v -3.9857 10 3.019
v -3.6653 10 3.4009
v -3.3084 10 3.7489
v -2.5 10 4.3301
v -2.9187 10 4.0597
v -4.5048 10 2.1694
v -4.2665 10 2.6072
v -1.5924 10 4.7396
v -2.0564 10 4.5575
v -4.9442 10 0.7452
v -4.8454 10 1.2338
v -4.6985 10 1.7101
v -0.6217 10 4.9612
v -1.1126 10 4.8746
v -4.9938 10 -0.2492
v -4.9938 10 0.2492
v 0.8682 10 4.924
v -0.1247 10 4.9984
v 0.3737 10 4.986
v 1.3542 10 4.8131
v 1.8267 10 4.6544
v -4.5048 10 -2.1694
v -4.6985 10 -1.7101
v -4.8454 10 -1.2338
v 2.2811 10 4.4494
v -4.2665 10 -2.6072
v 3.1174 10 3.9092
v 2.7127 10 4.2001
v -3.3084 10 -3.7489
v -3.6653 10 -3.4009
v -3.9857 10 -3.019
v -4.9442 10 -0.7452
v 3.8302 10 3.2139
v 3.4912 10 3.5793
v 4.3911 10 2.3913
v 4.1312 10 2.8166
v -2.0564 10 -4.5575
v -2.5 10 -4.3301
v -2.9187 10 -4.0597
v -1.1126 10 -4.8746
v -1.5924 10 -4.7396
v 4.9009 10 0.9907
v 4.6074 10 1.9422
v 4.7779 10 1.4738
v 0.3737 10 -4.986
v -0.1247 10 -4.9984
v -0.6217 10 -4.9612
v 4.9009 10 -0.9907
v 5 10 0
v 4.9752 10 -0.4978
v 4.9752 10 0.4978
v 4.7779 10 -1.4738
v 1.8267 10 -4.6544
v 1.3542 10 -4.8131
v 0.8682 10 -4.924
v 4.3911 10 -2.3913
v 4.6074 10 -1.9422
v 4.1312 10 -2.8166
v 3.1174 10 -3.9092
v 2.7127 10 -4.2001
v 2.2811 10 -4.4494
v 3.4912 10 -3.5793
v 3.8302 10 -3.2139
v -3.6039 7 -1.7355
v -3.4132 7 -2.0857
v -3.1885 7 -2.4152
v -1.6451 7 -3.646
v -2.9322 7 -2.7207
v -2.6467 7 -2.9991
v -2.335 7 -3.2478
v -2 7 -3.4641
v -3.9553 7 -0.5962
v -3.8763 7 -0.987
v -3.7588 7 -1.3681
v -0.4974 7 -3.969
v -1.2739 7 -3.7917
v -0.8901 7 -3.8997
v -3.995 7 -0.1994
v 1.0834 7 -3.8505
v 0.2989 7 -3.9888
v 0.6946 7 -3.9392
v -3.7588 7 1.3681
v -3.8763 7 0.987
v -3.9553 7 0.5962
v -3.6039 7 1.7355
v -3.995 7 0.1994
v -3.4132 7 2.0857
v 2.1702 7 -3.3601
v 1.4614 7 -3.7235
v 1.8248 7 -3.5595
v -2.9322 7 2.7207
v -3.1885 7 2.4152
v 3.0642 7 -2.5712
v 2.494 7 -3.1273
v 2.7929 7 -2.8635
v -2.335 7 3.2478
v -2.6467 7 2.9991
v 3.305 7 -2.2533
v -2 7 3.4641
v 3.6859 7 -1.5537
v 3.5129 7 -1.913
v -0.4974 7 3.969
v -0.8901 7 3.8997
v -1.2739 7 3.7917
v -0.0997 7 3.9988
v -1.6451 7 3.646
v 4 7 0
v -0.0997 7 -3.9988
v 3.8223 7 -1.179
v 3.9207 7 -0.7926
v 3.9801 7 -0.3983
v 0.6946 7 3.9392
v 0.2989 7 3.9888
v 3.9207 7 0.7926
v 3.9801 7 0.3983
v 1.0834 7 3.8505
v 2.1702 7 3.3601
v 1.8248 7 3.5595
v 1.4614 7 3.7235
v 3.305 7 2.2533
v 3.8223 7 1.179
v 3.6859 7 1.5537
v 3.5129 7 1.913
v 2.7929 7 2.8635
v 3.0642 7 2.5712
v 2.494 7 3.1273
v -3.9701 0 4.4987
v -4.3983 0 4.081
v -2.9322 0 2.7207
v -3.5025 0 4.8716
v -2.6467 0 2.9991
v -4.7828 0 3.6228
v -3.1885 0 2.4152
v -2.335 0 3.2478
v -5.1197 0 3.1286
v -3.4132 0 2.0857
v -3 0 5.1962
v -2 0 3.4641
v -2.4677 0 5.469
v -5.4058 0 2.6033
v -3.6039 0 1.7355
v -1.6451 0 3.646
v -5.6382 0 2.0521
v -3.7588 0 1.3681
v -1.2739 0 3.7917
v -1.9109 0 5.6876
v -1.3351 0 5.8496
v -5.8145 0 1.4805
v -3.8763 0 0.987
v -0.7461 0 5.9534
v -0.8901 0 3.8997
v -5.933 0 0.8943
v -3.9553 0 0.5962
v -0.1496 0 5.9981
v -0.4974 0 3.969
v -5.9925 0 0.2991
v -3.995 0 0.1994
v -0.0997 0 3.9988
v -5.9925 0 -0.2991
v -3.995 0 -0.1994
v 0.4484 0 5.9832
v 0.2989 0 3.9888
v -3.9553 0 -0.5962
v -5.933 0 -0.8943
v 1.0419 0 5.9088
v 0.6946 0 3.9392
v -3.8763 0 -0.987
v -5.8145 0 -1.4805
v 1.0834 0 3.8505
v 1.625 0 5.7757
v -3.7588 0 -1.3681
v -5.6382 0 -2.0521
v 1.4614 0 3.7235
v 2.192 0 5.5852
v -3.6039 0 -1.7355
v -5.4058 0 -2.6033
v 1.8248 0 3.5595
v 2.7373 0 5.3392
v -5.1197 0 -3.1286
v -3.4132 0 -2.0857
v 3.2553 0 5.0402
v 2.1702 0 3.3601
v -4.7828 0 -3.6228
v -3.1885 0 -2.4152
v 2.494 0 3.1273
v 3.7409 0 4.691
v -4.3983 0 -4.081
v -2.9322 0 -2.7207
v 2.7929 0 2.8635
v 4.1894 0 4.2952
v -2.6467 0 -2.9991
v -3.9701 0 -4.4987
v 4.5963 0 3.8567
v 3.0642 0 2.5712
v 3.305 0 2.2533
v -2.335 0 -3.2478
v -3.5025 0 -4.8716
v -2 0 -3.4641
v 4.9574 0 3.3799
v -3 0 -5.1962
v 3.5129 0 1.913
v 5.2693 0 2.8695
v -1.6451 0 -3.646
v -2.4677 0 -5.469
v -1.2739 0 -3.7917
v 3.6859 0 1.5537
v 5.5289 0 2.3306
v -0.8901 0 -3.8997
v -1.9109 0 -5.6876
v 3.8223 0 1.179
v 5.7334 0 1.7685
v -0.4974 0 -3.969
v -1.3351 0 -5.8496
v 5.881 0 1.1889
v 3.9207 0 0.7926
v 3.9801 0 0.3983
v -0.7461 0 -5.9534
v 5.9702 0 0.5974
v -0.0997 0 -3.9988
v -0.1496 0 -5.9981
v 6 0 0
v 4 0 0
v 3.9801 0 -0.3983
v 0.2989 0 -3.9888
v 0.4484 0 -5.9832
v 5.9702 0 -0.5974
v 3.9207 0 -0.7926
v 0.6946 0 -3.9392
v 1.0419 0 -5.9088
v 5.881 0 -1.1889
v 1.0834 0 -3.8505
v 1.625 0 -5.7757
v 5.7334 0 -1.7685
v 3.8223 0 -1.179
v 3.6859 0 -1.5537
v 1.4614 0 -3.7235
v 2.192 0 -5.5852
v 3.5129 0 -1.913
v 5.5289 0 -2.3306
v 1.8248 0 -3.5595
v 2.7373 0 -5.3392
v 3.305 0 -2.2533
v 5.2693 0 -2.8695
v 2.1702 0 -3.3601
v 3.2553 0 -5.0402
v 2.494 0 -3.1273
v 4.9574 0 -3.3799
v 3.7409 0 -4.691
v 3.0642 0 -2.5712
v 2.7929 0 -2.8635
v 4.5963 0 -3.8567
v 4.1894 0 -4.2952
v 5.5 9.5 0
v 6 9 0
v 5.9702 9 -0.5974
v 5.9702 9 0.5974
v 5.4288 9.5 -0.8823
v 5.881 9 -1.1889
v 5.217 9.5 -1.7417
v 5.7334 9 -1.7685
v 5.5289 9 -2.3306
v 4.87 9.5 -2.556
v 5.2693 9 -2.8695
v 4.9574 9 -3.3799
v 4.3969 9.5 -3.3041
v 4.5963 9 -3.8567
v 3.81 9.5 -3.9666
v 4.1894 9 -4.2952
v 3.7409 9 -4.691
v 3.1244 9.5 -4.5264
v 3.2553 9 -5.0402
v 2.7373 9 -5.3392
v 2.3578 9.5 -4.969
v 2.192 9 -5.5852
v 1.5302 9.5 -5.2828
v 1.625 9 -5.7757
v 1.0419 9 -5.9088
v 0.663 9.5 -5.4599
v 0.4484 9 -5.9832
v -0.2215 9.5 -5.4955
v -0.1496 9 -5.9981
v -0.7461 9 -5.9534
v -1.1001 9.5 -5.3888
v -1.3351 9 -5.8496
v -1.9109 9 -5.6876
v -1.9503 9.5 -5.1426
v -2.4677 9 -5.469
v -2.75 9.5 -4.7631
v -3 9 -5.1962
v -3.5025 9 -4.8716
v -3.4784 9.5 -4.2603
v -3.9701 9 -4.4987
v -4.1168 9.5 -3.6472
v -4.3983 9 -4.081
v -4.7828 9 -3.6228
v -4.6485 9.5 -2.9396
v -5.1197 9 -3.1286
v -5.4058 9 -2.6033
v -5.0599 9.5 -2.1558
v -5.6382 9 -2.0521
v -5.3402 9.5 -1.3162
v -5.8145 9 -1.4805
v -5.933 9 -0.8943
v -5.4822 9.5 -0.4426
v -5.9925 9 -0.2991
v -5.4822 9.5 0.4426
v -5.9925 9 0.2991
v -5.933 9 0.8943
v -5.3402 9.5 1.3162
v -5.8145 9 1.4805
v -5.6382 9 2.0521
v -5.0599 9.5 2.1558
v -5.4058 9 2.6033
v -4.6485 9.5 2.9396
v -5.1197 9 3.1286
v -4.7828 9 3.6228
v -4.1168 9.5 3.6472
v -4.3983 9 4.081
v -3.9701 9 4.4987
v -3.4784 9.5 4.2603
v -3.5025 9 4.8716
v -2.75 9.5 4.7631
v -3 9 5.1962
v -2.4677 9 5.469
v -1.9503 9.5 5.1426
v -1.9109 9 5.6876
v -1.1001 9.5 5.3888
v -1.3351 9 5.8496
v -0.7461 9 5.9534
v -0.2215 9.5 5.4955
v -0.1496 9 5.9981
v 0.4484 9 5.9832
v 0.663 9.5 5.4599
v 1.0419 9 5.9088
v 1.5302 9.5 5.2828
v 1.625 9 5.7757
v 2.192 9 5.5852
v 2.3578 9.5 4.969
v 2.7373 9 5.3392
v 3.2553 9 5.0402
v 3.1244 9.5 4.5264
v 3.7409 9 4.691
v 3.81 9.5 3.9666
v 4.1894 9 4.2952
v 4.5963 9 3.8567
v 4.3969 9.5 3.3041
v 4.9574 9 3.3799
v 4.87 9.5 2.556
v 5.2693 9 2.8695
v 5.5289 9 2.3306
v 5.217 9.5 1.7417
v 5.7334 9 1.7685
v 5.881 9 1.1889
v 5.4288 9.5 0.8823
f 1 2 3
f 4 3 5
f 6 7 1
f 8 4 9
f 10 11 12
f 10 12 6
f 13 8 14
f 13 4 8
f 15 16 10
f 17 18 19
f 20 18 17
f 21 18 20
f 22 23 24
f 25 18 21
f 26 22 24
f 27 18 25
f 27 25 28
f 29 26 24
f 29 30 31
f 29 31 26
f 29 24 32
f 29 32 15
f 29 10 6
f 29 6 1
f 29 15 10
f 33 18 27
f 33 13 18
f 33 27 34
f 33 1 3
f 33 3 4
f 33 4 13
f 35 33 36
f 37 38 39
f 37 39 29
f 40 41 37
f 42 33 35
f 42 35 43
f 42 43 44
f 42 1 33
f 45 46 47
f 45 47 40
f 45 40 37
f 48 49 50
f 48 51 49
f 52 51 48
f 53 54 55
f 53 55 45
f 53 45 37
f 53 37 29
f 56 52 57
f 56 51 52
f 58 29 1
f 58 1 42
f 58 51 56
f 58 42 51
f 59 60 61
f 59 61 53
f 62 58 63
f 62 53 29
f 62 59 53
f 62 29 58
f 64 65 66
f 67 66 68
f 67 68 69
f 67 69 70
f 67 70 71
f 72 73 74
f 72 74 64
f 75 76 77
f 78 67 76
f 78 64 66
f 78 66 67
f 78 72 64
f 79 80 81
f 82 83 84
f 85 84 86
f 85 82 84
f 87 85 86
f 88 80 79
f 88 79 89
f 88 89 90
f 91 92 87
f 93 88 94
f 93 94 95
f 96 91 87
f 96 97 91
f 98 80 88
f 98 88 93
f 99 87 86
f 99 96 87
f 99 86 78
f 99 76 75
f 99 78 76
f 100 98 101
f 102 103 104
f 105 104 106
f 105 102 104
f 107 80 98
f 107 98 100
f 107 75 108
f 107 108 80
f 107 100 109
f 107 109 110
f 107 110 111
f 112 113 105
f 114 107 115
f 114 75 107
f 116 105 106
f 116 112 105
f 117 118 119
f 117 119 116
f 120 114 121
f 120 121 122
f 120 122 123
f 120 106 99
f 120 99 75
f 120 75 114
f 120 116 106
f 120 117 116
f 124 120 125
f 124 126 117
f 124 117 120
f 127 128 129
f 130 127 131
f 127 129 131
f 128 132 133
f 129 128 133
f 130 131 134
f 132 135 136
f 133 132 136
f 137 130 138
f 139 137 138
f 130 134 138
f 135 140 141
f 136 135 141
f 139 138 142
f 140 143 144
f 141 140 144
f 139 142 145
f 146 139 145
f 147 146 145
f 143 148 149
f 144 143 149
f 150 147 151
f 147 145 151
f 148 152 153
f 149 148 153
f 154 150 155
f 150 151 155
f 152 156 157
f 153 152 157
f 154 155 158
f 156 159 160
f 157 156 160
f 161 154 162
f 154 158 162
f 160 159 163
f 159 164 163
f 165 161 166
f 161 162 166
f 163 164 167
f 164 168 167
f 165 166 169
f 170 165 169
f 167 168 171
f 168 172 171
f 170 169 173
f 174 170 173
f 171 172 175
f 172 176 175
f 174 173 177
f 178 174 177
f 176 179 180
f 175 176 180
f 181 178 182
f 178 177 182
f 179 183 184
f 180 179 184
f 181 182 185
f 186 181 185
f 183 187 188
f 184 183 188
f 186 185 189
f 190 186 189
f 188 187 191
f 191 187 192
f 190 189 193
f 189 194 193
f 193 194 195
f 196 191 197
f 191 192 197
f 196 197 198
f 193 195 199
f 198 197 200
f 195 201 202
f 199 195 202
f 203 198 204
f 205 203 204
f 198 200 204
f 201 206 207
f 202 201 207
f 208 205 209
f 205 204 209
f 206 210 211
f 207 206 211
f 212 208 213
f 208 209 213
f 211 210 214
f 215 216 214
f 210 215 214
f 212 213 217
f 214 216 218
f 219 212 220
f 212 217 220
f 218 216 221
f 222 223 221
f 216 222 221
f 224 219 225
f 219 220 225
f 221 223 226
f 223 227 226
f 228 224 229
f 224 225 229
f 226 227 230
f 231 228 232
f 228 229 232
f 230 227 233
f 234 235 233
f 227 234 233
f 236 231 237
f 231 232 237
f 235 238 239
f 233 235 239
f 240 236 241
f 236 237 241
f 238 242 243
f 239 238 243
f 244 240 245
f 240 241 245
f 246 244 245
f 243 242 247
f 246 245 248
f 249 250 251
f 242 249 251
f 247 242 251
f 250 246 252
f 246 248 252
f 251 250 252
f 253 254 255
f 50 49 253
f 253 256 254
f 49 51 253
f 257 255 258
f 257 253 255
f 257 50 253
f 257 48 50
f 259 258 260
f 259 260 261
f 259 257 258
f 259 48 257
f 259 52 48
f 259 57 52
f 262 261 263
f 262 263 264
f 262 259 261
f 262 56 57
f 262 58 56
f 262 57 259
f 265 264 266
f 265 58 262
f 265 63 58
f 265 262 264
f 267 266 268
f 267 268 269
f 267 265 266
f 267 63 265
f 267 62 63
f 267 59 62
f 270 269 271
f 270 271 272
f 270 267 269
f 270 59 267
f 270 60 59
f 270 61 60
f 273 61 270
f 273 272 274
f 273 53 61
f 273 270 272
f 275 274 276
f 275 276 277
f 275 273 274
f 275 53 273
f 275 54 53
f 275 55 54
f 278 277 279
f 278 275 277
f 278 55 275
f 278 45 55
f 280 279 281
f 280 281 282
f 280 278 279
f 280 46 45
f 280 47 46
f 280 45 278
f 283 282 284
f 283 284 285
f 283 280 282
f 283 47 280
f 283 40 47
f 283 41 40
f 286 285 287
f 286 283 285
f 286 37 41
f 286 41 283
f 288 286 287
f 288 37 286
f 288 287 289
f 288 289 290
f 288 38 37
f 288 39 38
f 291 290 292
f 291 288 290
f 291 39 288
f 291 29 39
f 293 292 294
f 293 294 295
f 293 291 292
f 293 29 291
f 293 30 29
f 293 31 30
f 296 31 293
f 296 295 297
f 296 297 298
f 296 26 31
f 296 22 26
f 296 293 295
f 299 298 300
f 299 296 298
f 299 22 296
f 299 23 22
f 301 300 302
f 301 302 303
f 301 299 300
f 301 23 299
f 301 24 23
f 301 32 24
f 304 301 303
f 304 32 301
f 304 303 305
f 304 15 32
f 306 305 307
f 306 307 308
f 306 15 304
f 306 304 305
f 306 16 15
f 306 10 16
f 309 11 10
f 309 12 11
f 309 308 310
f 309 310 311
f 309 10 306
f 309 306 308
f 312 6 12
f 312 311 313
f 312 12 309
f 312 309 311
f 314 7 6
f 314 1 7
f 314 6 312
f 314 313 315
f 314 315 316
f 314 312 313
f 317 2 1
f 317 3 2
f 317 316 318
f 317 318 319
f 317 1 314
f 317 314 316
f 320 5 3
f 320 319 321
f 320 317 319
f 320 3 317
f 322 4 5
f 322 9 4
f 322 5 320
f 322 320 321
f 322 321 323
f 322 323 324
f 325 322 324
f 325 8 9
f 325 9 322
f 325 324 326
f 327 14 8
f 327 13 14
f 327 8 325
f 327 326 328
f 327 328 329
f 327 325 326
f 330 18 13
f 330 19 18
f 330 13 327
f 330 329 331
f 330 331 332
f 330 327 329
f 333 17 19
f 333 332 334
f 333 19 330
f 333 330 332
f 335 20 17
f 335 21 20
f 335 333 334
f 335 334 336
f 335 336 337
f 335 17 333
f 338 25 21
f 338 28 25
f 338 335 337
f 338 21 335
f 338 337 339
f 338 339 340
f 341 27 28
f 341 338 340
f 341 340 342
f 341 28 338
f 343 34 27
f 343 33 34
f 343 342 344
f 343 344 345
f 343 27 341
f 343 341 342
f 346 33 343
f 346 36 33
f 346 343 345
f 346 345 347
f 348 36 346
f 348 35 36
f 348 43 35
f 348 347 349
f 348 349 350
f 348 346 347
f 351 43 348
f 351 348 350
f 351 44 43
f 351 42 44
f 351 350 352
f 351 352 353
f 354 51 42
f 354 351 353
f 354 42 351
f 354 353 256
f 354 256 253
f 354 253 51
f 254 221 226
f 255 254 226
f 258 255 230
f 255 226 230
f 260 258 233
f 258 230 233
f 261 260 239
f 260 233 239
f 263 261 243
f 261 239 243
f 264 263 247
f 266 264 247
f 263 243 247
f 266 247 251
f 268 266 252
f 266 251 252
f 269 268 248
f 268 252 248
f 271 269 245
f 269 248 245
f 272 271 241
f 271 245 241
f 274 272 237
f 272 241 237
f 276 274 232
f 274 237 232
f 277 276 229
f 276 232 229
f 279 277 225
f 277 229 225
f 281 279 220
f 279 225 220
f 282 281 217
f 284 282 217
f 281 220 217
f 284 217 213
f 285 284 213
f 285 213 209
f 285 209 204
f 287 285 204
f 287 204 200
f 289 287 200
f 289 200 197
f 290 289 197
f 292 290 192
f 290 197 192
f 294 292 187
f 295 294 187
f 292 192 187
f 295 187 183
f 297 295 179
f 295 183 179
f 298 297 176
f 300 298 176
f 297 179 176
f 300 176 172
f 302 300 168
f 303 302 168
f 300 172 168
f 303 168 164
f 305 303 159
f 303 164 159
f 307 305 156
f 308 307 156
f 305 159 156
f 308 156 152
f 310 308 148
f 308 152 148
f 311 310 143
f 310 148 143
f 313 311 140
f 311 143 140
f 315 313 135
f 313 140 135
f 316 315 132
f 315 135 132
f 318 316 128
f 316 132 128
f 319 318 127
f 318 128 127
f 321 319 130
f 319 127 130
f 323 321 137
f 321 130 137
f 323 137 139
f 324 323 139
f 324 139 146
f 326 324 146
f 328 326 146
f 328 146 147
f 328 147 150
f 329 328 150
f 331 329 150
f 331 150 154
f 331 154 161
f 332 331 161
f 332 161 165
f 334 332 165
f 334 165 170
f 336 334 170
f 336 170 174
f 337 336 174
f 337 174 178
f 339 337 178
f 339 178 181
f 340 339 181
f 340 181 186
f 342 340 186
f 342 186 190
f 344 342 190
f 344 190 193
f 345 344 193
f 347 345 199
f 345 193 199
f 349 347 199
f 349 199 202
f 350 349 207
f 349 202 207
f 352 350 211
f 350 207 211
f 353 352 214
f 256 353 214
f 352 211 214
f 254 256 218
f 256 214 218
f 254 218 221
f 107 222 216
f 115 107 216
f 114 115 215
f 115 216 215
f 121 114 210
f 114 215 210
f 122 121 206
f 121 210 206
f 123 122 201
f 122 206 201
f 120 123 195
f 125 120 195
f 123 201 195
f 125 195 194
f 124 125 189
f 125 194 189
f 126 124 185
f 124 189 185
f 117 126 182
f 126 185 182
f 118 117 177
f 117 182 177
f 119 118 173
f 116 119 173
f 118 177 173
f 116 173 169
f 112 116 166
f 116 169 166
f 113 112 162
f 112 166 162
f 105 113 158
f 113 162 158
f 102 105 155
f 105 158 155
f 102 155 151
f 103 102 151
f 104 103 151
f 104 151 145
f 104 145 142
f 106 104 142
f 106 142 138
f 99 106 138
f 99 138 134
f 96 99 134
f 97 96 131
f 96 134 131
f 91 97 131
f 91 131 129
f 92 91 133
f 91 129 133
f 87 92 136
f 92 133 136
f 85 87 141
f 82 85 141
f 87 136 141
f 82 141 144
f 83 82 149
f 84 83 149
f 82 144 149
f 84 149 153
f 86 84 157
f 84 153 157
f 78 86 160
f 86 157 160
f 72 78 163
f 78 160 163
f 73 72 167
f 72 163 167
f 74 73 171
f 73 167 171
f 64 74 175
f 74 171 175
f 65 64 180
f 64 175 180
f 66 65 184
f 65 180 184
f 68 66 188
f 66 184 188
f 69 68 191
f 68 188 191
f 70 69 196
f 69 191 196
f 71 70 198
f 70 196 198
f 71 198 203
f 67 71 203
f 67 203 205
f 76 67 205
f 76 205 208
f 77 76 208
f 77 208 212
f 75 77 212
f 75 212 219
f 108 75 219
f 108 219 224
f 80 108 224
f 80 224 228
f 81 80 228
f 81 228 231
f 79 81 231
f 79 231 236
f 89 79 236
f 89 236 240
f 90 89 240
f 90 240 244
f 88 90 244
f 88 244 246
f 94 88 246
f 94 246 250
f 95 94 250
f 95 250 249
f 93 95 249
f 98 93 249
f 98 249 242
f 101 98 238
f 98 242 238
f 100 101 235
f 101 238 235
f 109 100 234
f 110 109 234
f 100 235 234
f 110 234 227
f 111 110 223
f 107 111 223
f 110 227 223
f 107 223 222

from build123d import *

# Parameters (mm, degrees)
SKETCH1_R           = 6
BOSS_EXTRUDE1_DEPTH = 10
CHAMFER1_SIZE       = 1
SKETCH2_R           = 4
CUT_EXTRUDE1_DEPTH  = 7


with BuildPart() as part:
    # Sketch1 → Boss-Extrude1 (new body)
    with BuildSketch(Plane(origin=(0, 0, 0), x_dir=(1, 0, 0), z_dir=(0, 1, 0))):
        Circle(SKETCH1_R)
    extrude(amount=BOSS_EXTRUDE1_DEPTH)

    # Chamfer1
    chamfer1_edges = [part.edges().sort_by_distance(p)[0] for p in [
        (-6, 10, 0),
    ]]
    chamfer(chamfer1_edges, length=CHAMFER1_SIZE)

    # Sketch2 → Cut-Extrude1 (cut)
    with BuildSketch(Plane.XZ):
        Circle(SKETCH2_R)
    extrude(amount=-CUT_EXTRUDE1_DEPTH, mode=Mode.SUBTRACT)


solid = part.part
